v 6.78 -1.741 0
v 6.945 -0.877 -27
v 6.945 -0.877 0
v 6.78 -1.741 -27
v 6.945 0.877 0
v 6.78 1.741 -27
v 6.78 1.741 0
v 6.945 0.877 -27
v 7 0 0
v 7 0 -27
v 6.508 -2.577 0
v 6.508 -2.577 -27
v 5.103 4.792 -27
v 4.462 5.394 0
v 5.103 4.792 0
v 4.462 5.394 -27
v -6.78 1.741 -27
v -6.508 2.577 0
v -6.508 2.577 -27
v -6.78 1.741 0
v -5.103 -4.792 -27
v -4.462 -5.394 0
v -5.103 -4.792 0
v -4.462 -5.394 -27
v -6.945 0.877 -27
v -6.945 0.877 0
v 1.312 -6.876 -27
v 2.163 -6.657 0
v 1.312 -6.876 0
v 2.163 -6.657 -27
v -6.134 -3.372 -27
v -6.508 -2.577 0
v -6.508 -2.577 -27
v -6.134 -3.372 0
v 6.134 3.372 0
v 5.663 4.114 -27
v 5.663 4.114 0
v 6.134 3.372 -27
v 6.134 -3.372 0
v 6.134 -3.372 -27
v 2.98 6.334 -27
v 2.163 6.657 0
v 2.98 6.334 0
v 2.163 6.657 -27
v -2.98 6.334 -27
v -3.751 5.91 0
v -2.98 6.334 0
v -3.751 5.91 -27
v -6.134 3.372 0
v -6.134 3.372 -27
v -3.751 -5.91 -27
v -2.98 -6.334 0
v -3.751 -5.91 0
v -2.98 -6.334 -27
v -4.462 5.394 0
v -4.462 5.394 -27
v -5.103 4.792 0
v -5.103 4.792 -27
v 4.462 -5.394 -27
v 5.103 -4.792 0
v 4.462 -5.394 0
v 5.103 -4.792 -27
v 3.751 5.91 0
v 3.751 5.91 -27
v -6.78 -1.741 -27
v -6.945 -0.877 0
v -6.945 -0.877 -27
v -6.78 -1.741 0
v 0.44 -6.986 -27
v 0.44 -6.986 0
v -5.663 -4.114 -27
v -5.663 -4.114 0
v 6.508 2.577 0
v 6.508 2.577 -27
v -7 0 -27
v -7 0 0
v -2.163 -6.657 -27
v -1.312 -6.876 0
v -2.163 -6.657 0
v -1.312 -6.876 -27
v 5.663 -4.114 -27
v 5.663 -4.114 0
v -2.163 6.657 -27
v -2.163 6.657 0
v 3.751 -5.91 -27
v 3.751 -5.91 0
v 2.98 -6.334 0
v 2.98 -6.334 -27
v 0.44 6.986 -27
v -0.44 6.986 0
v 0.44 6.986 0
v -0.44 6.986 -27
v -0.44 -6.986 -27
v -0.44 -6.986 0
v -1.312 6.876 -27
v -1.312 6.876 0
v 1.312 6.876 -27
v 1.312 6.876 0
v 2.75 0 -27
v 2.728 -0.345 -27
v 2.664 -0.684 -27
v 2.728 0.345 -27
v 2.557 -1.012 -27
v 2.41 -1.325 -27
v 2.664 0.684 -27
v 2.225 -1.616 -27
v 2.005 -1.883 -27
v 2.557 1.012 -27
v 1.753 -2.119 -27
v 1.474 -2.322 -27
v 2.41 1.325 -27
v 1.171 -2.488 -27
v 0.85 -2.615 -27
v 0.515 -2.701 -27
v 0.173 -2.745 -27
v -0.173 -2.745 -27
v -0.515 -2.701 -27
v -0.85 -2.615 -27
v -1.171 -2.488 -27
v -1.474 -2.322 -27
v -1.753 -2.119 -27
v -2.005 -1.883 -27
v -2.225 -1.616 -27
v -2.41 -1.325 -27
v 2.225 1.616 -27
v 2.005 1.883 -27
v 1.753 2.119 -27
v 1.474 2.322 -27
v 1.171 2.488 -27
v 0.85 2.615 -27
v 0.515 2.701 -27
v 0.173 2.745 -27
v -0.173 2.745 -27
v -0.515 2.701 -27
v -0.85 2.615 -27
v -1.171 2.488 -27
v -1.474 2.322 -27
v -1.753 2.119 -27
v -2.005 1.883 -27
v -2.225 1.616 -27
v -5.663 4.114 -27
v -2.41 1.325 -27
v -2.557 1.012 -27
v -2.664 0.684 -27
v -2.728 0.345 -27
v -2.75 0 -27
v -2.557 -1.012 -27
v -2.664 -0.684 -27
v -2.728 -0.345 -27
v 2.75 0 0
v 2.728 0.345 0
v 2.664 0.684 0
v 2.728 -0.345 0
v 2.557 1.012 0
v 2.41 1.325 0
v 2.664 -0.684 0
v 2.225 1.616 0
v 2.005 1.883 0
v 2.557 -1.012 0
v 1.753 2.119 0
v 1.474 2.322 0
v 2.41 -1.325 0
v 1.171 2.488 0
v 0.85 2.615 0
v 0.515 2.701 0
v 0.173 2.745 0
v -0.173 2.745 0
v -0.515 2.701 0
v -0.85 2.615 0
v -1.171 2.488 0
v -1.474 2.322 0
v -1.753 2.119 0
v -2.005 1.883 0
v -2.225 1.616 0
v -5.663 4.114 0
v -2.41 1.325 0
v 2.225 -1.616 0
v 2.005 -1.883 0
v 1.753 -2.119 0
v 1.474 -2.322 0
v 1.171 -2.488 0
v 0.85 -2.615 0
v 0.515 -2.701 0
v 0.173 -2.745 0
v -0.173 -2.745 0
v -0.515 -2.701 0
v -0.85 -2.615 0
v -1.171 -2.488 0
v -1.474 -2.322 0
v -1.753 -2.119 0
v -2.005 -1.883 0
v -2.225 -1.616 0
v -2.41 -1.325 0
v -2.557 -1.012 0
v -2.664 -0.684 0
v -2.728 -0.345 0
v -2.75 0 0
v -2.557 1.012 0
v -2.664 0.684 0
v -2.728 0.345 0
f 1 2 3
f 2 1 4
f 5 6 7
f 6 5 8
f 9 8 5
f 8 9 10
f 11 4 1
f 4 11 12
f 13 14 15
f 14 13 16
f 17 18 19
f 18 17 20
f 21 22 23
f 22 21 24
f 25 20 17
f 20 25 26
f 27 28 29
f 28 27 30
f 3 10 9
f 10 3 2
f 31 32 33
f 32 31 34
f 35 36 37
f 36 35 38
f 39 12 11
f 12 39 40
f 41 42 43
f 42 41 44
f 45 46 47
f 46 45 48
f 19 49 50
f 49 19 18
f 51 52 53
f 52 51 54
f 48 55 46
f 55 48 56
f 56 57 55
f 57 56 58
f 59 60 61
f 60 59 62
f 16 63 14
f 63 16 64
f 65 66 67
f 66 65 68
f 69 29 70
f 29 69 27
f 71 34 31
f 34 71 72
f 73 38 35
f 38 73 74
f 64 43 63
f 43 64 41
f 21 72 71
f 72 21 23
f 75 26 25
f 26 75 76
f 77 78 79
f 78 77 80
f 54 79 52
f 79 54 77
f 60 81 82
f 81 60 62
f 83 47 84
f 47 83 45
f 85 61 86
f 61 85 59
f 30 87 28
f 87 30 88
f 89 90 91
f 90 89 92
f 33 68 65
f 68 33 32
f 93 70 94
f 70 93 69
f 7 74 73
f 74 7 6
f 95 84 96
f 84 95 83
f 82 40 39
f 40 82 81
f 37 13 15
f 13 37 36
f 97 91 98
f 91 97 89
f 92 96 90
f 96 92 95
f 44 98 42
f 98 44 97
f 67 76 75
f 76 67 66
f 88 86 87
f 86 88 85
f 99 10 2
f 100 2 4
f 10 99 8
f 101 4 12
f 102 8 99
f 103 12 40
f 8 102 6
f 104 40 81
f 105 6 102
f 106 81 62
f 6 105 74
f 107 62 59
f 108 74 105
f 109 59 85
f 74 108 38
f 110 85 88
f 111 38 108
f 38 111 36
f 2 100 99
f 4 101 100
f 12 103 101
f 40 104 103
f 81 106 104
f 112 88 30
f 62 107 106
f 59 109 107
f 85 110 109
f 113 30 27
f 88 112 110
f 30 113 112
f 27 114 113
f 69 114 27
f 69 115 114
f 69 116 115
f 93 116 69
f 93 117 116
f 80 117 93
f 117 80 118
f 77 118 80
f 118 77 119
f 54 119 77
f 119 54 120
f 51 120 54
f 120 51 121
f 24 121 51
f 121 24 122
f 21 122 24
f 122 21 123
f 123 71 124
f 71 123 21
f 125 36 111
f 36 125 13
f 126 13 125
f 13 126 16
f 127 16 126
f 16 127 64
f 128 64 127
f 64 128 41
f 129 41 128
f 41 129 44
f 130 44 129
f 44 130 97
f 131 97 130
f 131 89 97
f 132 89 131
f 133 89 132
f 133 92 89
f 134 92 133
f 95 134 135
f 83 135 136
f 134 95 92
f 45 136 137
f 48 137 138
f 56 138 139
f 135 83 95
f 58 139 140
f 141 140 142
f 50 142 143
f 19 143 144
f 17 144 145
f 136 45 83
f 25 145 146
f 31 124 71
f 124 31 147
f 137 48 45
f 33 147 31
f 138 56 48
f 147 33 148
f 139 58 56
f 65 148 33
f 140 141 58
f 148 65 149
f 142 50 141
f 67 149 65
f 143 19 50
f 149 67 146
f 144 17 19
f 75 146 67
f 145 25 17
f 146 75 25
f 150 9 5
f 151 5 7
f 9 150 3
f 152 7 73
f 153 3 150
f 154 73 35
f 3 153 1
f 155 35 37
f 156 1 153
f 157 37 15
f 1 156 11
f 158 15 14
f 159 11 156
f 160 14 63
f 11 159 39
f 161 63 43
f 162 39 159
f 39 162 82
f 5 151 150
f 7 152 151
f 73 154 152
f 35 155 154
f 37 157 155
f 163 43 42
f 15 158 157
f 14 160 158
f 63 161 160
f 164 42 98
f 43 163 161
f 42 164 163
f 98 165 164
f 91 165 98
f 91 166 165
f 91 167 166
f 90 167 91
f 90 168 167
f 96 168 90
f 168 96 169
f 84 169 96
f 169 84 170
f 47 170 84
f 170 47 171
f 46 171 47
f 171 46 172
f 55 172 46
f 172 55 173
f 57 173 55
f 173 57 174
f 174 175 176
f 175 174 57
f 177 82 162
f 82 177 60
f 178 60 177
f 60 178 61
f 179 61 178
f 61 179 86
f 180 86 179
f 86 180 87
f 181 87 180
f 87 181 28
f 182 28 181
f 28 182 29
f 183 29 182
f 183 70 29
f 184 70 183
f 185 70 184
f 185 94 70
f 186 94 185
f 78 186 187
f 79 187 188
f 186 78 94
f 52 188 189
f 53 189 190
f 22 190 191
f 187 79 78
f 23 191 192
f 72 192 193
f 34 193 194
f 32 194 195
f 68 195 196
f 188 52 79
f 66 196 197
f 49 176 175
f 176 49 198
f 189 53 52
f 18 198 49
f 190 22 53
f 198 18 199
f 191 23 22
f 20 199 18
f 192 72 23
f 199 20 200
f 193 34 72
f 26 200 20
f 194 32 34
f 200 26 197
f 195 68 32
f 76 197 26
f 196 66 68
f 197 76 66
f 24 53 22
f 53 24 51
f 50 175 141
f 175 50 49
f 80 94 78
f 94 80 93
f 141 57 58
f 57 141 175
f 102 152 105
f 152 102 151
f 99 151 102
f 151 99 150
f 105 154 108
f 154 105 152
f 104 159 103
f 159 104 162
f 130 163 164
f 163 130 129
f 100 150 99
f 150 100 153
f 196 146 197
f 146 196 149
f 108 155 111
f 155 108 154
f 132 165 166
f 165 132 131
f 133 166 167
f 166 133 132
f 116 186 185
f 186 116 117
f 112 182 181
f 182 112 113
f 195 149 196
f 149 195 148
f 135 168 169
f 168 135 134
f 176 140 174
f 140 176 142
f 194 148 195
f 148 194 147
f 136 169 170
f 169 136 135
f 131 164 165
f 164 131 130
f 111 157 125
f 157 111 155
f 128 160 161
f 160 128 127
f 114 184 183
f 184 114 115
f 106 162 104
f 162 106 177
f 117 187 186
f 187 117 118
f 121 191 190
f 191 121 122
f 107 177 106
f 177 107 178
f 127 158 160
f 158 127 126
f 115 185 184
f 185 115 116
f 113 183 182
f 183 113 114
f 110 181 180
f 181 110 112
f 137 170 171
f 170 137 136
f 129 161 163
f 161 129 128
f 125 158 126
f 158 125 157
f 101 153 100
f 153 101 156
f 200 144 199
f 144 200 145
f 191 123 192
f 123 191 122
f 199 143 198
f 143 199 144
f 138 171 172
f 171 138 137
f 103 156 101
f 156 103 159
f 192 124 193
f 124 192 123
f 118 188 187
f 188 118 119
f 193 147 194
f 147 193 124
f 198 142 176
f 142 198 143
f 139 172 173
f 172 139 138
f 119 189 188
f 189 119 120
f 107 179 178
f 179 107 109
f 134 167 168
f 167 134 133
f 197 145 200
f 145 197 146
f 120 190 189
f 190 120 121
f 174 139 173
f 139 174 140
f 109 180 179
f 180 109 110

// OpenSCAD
$fn = 50;


difference() {
	union() {
		translate(v = [0, 0, -27.0000000000]) {
			cylinder(h = 27, r = 7.0000000000);
		}
	}
	union() {
		#translate(v = [0, 0, -27]) {
			cylinder(h = 27, r = 2.7500000000);
		}
	}
}
